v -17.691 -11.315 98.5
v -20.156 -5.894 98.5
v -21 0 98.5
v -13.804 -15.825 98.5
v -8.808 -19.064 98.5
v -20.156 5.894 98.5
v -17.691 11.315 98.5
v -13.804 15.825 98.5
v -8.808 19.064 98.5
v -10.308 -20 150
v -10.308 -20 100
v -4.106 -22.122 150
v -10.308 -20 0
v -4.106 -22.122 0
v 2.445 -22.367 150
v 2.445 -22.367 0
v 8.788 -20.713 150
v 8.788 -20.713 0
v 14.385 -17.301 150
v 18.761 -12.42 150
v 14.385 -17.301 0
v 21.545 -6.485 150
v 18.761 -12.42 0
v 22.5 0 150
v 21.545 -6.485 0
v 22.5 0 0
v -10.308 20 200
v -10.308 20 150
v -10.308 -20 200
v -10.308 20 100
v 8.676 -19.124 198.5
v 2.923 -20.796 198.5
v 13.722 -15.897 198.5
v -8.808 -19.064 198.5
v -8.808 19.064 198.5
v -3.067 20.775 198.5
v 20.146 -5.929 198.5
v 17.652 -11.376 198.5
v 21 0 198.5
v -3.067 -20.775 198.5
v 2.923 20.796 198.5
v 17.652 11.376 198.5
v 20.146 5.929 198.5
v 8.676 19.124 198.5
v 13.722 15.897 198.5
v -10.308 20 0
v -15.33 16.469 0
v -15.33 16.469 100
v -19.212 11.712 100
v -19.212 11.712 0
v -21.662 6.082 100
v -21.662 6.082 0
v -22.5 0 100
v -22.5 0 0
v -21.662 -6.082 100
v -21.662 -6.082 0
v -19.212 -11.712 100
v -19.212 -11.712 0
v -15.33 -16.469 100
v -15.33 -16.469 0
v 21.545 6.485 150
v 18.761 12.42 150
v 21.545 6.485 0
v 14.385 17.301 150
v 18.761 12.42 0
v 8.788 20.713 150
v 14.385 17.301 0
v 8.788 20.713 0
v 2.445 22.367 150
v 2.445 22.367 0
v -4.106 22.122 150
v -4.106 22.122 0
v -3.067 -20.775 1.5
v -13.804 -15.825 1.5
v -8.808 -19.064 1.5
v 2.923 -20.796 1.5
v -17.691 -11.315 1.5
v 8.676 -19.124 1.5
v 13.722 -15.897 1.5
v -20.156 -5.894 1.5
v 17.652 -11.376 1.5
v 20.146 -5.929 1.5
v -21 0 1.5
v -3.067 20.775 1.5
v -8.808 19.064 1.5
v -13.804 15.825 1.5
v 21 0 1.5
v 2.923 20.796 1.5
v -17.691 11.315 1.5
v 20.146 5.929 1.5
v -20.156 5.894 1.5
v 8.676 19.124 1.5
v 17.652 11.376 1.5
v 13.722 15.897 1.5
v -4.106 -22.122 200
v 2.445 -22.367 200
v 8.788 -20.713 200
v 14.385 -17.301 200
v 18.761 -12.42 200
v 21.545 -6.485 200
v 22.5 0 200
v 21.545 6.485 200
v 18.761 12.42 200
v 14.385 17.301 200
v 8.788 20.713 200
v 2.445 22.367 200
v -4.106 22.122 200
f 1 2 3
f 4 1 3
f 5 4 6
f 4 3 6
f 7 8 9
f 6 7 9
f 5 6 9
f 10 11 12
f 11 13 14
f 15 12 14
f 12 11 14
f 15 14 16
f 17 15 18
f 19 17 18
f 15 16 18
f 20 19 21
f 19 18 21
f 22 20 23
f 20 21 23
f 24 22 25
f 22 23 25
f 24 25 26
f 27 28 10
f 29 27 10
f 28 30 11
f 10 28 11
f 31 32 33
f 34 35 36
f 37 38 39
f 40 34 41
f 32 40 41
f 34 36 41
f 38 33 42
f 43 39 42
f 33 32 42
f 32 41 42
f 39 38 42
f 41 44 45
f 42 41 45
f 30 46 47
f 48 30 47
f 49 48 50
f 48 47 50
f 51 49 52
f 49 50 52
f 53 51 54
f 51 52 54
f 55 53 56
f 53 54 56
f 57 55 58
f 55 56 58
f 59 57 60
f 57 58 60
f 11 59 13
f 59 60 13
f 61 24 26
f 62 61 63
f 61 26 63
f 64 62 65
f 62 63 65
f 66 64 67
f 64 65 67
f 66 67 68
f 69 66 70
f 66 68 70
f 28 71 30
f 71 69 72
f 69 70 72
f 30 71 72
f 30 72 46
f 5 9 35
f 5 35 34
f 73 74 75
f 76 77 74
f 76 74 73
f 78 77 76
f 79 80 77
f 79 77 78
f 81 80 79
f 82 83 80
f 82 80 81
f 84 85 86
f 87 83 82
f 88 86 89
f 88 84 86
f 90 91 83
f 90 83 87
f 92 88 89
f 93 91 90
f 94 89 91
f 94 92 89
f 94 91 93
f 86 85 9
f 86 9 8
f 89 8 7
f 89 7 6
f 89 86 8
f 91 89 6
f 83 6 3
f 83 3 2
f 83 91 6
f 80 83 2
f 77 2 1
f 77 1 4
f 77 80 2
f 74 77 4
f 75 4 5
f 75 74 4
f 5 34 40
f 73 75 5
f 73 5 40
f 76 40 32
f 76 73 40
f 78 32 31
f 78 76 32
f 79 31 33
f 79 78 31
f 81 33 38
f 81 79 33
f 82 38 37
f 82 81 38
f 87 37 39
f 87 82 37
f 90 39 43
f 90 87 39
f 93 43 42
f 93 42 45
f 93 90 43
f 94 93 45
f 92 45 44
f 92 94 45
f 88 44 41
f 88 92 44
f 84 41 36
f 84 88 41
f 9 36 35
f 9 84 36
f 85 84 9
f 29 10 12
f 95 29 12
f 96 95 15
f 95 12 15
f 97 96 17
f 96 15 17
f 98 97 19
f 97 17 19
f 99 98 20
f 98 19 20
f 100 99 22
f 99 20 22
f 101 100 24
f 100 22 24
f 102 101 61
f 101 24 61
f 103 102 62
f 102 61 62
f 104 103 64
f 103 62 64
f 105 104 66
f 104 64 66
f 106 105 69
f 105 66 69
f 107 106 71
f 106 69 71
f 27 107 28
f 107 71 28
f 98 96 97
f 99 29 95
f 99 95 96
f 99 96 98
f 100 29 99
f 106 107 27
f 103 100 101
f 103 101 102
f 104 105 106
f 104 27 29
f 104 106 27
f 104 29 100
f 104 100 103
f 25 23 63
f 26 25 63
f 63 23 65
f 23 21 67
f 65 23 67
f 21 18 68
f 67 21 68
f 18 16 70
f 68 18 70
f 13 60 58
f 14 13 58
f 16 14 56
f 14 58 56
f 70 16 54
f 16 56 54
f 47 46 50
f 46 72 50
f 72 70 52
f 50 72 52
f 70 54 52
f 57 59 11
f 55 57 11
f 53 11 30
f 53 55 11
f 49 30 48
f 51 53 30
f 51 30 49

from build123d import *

# Parameters (mm, degrees)
EXTRUDE_4_DEPTH = 150
SKETCH_1_5_R    = 22.5
EXTRUDE_5_DEPTH = 100
EXTRUDE_6_DEPTH = 50
SHELL_START     = 1.5
SHELL_3_DEPTH   = 197
SHELL_3_2_DEPTH = 97


# Read off the part's stored shape, not the designer's step: 抽壳3
with BuildPart() as part:
    # 草图1 → 凸台-拉伸4 (new body)
    with BuildSketch(Plane.XY):
        with BuildLine():
            ThreePointArc((22.5, 0), (11.711646096, 19.211646096), (-10.307764064, 20))
            Line((-10.307764064, 20), (-10.307764064, -20))
            ThreePointArc((-10.307764064, -20), (11.711646096, -19.211646096), (22.5, 0))
        make_face()
    extrude(amount=EXTRUDE_4_DEPTH)

    # 草图1<5> → 凸台-拉伸5 (add)
    with BuildSketch(Plane.XY):
        with Locations(Location((0, 0, 0), (0, 0, 117.266044451))):
            Circle(SKETCH_1_5_R)
    extrude(amount=EXTRUDE_5_DEPTH)

    # 草图4 → 凸台-拉伸6 (add)
    with BuildSketch(Plane.XY.offset(150)):
        with BuildLine():
            ThreePointArc((-10.307764064, -20), (22.5, 0), (-10.307764064, 20))
            Line((-10.307764064, 20), (-10.307764064, -20))
        make_face()
    extrude(amount=EXTRUDE_6_DEPTH)

    # 抽壳3 outline → 抽壳3 (cut)
    with BuildSketch(Plane.XY.offset(SHELL_START)):
        with BuildLine():
            Line((-8.807764064, 19.063664186), (-8.807764064, -19.063664186))
            ThreePointArc((-8.807764064, -19.063664186), (21, 0), (-8.807764064, 19.063664186))
        make_face()
    extrude(amount=SHELL_3_DEPTH, mode=Mode.SUBTRACT)

    # Shell 3 2 outline → Shell 3 2 (cut)
    with BuildSketch(Plane.XY.offset(SHELL_START)):
        with BuildLine():
            ThreePointArc((-8.807764064, 19.063664186), (-21, 0), (-8.807764064, -19.063664186))
            Line((-8.807764064, -19.063664186), (-8.807764064, 19.063664186))
        make_face()
    extrude(amount=SHELL_3_2_DEPTH, mode=Mode.SUBTRACT)


solid = part.part
